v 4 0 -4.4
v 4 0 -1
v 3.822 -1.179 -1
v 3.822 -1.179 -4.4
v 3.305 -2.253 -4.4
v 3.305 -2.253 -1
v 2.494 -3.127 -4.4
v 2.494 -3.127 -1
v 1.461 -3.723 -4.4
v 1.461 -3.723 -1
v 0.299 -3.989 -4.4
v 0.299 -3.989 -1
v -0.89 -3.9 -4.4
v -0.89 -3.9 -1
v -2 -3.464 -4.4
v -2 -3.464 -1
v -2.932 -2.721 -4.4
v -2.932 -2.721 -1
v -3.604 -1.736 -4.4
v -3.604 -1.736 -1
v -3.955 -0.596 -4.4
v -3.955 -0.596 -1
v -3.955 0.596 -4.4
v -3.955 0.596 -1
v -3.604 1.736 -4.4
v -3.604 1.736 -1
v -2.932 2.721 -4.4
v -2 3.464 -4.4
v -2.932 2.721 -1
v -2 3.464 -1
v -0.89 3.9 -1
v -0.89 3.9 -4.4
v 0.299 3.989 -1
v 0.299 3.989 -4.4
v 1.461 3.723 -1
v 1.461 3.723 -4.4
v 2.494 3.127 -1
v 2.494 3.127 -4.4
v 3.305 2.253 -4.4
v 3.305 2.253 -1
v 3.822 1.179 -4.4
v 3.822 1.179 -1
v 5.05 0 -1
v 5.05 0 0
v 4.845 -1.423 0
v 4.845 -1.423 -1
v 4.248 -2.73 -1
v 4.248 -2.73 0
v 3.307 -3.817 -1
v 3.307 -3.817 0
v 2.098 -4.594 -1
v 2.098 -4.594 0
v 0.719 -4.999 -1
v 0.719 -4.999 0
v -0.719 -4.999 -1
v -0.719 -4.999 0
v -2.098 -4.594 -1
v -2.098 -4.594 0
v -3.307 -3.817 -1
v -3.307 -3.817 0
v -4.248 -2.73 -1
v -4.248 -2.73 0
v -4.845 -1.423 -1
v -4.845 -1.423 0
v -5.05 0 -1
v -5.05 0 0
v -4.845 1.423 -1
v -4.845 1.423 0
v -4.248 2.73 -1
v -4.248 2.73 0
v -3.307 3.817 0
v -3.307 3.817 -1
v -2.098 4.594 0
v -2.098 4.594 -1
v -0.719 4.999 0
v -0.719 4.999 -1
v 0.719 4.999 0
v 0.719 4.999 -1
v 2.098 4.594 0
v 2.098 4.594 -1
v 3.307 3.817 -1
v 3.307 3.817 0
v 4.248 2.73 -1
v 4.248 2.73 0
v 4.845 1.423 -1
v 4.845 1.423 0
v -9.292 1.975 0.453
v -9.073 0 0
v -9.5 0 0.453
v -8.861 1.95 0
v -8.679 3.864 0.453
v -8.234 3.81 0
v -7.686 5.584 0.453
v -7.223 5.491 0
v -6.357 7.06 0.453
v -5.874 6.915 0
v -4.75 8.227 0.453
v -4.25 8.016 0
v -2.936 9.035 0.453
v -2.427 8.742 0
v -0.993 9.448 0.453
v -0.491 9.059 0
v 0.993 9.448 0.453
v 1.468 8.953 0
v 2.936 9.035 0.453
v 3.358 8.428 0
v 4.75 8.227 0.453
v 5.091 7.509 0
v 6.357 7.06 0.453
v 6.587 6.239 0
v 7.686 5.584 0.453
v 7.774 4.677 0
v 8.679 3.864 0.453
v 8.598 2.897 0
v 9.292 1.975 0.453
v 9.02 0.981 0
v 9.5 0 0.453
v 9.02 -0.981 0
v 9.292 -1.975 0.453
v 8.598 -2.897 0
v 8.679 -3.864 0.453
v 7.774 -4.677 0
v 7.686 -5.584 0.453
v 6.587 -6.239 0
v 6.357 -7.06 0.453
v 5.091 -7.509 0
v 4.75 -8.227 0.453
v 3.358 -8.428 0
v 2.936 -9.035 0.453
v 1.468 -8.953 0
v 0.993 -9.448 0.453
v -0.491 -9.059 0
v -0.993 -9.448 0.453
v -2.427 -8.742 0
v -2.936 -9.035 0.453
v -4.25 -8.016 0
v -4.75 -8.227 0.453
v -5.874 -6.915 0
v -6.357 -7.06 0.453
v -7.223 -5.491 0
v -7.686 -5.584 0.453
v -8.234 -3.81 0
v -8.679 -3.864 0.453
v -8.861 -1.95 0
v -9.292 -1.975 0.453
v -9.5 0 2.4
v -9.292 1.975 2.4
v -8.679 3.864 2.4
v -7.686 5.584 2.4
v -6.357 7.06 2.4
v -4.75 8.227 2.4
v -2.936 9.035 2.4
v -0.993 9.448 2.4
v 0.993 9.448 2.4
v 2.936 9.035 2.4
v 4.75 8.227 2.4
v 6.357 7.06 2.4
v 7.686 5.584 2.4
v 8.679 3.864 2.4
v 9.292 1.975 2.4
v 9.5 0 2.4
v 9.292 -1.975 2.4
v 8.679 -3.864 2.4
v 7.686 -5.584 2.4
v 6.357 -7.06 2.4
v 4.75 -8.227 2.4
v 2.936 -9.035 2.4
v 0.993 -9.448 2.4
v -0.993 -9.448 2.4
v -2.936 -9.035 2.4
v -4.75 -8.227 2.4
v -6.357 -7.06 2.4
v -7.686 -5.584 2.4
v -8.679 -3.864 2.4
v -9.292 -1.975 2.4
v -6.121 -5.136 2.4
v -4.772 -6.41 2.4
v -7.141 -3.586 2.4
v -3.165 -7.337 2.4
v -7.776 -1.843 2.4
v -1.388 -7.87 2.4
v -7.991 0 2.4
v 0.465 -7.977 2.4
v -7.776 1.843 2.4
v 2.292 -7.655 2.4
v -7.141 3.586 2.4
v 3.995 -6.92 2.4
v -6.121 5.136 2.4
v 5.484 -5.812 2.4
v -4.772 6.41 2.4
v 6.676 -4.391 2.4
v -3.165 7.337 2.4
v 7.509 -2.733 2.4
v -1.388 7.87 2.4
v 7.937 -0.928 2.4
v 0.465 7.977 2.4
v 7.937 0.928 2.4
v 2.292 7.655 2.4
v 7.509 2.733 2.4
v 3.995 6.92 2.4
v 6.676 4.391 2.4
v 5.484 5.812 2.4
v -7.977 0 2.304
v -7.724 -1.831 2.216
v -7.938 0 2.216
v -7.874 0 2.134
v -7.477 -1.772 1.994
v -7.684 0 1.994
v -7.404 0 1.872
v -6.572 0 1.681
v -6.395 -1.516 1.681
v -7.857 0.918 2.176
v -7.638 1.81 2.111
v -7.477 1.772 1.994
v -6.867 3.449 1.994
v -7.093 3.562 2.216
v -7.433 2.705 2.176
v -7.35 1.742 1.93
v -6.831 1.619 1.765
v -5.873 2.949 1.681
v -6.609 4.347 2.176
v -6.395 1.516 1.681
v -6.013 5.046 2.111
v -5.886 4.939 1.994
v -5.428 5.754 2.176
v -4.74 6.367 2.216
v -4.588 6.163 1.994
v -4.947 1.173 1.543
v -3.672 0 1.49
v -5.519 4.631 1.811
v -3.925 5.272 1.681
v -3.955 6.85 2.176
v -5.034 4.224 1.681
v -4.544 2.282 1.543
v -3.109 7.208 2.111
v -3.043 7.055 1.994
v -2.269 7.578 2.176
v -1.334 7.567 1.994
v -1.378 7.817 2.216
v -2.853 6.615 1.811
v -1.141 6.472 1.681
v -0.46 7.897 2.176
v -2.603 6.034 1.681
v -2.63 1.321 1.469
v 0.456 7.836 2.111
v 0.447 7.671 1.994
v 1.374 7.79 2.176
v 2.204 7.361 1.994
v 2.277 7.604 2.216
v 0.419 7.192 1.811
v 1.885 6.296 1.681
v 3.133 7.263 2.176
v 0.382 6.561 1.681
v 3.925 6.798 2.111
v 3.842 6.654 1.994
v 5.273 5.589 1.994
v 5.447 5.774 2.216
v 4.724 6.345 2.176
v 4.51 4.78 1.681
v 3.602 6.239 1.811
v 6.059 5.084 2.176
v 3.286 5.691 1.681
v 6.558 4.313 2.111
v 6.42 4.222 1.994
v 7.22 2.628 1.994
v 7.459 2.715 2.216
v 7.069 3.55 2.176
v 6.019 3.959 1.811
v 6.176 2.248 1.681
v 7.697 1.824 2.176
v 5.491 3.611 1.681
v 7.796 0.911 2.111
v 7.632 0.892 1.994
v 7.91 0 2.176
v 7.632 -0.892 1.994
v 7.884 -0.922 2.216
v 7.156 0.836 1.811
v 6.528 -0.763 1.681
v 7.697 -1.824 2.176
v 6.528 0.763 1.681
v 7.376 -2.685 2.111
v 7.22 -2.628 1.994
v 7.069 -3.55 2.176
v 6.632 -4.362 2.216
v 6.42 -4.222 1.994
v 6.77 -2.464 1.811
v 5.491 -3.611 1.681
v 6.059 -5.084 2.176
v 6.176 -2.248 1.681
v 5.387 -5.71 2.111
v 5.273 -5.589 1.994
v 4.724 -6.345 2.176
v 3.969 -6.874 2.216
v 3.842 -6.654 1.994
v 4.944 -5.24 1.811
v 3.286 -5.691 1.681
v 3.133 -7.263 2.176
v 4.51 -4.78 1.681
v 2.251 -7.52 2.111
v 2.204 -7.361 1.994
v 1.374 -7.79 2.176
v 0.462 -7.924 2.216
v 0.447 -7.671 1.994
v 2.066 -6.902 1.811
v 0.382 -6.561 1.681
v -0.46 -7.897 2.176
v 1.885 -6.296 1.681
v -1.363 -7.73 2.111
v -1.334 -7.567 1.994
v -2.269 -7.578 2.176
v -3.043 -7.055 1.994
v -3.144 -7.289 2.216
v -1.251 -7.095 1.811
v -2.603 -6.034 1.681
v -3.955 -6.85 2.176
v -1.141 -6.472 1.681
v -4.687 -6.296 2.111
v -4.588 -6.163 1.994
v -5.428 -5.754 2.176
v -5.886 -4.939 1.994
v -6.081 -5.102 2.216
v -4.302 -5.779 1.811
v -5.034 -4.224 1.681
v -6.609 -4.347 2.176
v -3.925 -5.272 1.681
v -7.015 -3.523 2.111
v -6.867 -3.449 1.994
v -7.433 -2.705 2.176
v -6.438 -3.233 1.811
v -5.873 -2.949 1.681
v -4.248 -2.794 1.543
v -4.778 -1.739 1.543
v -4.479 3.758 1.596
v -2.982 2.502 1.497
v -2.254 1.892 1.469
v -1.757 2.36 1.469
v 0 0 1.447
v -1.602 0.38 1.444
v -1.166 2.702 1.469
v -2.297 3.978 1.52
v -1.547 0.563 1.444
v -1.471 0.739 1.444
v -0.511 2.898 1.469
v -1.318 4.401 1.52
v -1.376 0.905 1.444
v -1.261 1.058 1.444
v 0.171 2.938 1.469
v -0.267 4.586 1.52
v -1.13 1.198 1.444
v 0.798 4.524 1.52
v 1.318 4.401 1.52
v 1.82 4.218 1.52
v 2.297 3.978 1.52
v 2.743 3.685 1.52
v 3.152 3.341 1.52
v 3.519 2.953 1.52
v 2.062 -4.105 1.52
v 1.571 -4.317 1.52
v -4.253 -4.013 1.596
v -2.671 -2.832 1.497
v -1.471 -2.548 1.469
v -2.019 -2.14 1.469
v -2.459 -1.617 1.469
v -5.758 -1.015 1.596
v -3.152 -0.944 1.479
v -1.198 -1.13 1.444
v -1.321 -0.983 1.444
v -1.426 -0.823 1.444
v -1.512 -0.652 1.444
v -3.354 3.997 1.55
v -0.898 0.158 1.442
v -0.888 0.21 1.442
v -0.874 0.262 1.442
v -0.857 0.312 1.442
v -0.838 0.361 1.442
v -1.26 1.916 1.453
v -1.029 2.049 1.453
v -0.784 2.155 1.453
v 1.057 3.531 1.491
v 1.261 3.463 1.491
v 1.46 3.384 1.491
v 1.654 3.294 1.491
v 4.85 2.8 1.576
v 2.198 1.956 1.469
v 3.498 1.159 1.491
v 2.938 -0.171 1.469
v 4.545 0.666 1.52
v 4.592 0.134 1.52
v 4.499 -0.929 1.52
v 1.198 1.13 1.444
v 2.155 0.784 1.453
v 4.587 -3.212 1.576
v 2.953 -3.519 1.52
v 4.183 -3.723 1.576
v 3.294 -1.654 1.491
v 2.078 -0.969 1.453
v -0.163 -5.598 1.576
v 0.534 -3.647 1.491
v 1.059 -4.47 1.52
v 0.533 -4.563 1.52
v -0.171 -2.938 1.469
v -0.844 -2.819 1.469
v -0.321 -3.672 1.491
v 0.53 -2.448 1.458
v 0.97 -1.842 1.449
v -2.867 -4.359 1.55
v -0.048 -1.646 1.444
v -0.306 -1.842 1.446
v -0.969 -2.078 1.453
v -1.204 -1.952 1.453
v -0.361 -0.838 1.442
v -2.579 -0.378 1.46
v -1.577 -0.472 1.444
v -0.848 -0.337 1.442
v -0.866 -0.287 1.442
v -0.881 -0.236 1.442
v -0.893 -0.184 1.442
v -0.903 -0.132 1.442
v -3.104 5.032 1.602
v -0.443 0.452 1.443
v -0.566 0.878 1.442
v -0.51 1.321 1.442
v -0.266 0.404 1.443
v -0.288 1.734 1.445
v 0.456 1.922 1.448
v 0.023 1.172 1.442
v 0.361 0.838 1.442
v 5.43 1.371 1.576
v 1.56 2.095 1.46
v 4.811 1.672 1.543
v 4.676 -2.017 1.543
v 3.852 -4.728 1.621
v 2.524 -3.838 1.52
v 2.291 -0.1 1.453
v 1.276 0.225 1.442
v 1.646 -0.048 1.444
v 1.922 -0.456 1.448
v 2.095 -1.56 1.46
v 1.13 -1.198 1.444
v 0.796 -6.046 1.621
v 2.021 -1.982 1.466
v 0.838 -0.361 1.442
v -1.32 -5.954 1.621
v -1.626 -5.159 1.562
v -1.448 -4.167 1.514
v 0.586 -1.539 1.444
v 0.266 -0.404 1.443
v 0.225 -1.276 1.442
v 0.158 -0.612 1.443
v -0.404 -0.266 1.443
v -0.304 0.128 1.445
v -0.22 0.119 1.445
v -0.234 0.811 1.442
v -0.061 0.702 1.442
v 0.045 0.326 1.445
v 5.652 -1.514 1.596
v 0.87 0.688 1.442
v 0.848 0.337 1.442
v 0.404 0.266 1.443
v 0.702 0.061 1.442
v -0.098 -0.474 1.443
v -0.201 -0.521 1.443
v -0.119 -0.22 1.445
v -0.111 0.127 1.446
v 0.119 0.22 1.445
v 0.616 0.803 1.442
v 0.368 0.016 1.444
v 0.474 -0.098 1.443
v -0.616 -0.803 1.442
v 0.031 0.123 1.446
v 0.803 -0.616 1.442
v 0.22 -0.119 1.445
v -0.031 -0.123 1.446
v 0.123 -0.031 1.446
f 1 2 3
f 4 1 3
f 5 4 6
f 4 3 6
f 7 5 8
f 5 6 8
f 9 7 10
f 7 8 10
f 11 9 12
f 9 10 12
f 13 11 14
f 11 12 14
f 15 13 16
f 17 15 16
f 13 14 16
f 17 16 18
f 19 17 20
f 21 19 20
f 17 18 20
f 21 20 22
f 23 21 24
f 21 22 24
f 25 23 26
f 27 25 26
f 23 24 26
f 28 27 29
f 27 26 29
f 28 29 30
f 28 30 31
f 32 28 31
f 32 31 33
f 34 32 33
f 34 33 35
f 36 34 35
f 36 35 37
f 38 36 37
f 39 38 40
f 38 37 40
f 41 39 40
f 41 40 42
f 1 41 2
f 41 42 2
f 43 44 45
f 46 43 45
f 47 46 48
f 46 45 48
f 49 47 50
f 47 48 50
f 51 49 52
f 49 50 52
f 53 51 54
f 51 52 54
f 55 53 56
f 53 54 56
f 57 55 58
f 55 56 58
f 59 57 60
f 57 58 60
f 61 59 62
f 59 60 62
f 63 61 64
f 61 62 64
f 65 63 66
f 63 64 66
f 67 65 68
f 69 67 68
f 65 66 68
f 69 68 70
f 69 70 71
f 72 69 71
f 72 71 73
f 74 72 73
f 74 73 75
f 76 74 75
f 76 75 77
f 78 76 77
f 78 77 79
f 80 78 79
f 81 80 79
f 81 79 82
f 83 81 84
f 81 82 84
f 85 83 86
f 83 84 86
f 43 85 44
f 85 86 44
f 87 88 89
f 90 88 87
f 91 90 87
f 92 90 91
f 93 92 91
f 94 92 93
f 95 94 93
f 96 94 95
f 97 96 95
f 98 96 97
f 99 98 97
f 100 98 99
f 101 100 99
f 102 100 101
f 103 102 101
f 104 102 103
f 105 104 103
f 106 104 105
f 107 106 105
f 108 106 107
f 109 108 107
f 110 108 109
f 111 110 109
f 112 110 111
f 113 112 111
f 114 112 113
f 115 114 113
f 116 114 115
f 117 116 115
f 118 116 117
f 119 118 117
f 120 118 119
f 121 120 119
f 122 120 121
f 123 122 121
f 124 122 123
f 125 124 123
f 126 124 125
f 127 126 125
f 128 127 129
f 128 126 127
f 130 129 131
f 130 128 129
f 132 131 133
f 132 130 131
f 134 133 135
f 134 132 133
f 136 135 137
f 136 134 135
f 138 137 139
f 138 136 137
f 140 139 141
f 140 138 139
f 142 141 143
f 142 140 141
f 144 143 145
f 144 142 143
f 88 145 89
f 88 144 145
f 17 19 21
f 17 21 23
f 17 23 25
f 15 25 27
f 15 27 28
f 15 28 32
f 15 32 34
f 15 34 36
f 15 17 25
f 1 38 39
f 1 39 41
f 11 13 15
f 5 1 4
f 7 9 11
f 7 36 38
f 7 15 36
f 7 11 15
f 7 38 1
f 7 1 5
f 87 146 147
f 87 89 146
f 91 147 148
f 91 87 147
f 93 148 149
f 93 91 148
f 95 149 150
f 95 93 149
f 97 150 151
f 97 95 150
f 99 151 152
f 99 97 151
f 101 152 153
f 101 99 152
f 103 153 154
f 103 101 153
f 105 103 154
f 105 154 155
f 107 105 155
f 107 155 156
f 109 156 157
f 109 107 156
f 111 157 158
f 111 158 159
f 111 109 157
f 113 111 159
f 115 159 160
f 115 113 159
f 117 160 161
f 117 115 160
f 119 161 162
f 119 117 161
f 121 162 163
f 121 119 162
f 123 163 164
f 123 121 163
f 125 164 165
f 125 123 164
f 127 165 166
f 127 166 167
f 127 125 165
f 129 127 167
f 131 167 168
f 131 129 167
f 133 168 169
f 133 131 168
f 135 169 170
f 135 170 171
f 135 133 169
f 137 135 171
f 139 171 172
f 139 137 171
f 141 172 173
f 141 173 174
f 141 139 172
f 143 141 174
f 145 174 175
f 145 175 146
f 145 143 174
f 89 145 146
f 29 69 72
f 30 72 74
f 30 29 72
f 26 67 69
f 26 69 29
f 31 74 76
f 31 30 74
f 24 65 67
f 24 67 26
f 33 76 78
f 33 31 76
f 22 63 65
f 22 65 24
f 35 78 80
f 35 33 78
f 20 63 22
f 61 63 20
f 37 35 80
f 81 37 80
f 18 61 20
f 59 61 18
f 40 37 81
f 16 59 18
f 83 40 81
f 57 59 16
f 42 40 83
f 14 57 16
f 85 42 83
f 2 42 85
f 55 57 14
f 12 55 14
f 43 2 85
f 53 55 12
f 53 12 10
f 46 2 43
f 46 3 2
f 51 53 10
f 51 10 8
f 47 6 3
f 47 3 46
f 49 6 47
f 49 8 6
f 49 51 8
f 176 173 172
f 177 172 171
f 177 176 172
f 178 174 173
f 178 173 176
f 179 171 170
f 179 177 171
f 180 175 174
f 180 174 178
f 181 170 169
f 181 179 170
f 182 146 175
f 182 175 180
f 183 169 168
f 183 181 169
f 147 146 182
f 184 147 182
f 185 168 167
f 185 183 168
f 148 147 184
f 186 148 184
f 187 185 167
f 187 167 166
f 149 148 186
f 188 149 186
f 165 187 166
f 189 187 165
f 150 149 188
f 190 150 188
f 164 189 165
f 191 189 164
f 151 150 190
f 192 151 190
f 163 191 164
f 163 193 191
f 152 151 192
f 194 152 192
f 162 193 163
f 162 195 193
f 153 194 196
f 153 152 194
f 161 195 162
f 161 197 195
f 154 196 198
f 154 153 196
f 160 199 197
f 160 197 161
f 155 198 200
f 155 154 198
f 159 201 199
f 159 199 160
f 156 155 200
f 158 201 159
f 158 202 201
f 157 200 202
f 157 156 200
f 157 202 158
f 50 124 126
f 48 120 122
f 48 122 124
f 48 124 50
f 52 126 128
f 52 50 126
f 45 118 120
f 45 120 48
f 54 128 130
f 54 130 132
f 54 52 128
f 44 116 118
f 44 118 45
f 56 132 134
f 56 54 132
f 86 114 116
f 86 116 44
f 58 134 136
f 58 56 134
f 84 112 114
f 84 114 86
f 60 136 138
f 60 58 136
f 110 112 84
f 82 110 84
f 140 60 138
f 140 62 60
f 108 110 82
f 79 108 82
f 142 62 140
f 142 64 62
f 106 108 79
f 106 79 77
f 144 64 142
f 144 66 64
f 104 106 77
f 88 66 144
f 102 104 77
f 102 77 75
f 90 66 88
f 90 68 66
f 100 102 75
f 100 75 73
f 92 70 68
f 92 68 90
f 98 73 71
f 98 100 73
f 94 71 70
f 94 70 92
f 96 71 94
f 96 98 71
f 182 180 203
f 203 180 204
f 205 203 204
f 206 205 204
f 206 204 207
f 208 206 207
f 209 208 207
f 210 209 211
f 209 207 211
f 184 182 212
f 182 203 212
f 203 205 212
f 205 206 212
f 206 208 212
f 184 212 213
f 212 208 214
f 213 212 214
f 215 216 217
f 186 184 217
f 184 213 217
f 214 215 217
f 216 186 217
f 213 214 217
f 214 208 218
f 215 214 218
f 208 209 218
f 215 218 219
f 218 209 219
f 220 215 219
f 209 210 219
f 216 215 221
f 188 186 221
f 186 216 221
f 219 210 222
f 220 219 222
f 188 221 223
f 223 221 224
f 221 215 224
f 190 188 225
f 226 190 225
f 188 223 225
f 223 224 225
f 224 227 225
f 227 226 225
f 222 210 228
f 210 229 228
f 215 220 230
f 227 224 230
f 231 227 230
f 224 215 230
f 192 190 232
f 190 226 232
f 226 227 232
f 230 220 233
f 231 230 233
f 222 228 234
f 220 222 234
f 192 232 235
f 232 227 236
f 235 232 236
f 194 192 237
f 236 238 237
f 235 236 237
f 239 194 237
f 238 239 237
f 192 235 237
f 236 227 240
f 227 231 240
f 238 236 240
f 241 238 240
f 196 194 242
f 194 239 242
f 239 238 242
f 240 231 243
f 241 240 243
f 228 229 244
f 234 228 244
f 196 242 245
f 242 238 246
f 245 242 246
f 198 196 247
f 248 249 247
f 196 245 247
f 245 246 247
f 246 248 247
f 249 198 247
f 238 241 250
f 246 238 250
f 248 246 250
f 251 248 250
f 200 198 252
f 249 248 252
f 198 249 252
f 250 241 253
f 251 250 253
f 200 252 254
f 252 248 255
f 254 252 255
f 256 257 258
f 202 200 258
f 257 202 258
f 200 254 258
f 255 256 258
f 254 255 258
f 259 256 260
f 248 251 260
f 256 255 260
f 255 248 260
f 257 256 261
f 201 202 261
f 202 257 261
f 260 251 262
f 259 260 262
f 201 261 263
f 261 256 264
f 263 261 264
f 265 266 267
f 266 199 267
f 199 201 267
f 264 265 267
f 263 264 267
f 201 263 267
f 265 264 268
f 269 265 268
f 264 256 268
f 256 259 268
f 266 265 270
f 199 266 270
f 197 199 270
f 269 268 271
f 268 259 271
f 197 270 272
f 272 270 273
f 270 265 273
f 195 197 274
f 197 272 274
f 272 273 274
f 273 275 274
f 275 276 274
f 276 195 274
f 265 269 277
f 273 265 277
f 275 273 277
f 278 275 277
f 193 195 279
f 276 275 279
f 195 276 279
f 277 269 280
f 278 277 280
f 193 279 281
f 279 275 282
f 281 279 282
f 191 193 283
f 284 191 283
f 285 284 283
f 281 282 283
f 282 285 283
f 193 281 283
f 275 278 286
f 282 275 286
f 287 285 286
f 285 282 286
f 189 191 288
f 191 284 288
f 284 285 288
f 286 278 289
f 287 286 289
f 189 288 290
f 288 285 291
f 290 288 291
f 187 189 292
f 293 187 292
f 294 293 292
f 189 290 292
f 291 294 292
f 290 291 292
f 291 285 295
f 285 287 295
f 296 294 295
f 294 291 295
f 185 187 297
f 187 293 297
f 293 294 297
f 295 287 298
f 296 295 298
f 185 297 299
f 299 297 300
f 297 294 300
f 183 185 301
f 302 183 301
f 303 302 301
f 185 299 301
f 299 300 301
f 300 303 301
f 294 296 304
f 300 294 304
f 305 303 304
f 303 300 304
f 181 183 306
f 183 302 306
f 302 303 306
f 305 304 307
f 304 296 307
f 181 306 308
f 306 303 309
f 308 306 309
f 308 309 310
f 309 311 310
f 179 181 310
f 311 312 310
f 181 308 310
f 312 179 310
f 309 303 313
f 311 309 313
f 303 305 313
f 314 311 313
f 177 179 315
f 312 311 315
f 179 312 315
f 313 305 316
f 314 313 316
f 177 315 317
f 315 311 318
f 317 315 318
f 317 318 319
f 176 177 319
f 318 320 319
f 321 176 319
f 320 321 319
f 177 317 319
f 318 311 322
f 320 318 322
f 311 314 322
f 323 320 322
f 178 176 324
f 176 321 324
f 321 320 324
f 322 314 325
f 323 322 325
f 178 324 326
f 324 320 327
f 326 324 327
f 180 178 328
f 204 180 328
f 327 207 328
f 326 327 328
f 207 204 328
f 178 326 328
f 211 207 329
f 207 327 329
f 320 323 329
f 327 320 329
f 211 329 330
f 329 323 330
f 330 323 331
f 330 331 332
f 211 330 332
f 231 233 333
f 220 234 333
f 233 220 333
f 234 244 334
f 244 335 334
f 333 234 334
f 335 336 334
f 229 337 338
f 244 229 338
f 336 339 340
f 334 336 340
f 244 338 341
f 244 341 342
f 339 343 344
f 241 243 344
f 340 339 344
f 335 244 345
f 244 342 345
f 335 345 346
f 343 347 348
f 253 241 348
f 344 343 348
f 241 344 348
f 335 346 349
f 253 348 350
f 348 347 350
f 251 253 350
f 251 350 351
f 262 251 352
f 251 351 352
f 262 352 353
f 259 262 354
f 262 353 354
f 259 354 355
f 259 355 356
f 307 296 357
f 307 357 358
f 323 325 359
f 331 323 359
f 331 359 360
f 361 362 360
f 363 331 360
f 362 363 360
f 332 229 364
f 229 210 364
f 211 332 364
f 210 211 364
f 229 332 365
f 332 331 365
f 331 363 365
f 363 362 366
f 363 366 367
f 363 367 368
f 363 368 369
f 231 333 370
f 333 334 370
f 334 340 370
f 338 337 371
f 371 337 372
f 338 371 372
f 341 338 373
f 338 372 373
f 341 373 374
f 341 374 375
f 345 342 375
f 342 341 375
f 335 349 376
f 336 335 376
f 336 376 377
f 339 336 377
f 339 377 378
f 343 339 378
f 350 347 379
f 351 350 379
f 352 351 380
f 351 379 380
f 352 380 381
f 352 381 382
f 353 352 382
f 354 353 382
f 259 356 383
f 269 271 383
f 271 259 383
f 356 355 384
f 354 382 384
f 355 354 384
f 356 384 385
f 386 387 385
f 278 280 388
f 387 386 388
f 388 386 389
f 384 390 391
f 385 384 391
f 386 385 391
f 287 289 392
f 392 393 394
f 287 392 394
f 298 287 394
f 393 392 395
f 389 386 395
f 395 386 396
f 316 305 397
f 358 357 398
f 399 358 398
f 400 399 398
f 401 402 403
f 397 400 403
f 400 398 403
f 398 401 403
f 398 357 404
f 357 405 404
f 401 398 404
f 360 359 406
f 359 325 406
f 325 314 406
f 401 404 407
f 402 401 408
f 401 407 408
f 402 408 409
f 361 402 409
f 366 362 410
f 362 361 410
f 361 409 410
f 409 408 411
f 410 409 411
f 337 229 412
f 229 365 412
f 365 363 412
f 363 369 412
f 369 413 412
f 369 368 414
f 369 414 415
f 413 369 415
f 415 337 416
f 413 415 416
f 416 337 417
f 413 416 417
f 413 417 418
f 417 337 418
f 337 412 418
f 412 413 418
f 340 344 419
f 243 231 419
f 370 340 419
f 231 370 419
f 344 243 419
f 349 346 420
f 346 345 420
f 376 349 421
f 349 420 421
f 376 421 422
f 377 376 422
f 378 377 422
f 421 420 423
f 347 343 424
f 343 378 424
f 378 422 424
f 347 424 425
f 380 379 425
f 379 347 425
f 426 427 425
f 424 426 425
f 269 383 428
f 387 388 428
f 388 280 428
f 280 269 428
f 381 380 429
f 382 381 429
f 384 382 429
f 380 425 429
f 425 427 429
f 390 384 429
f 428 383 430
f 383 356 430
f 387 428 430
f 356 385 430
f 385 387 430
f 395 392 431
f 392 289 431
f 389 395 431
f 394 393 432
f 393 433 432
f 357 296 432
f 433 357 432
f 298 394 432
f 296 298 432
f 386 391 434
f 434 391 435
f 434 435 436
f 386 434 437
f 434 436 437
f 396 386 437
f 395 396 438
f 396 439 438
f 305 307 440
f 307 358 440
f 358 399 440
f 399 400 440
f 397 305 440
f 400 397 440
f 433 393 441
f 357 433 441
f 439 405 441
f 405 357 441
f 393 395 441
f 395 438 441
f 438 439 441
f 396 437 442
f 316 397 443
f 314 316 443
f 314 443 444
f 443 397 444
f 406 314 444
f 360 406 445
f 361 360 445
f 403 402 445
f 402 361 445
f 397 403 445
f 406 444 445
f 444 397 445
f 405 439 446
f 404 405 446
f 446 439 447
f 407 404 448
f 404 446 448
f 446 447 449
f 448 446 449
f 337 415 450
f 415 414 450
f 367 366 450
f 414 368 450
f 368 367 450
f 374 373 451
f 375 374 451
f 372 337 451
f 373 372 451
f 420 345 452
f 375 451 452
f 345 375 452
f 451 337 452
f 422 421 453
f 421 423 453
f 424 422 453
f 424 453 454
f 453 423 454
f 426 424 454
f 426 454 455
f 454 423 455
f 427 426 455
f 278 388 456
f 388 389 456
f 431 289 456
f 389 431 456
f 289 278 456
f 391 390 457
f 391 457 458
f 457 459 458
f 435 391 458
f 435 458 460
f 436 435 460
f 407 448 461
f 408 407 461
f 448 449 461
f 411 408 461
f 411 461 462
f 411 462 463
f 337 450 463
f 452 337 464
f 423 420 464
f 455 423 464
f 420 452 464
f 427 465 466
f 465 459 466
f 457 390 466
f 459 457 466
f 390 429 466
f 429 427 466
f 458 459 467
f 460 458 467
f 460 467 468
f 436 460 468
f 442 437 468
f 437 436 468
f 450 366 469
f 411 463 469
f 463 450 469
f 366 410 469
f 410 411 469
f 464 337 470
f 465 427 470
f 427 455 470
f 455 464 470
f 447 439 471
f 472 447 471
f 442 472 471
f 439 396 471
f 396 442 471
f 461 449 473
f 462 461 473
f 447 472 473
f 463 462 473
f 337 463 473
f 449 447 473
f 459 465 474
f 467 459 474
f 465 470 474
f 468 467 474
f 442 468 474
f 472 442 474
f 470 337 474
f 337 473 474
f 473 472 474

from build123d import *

# Parameters (mm, degrees)
F2_R     = 5.05
F3_DEPTH = 1
F4_R     = 4
F5_DEPTH = 3.4


with BuildPart() as f1:
    # F0 (on Front) → F1 (revolve)
    with BuildSketch(Plane.XZ):
        with BuildLine():
            Line((-7.9909514666, 2.4), (-9.5, 2.4))
            Line((-9.5, 2.4), (-9.5, 0.4530665231))
            Line((-9.5, 0.4530665231), (-9.0727129846, 0))
            Line((-9.0727129846, 0), (0, 0))
            Line((0, 0), (0, 1.4471871546))
            add(Edge.make_bspline(
                [(-7.9909514666, 2.4), (-7.9909515723, 1.617711094), (-2.9710125266, 1.4720783209), (-1.7912473995, 1.4308859827), (0, 1.4471871546)],
                knots=[0, 0, 0, 0, 0.5112998469, 1, 1, 1, 1], degree=3))
        make_face()
    revolve(axis=Axis((0, 0, 1.4471871546), (0, 0, -1)))

    # F2 (on face) → F3 (join)
    with BuildSketch(Plane(origin=(0, 0, 0), x_dir=(1, 0, 0), z_dir=(0, 0, -1))):
        Circle(F2_R)
    extrude(amount=F3_DEPTH)

    # F4 (on face) → F5 (join)
    with BuildSketch(Plane(origin=(0, 0, -1), x_dir=(1, 0, 0), z_dir=(0, 0, -1))):
        Circle(F4_R)
    extrude(amount=F5_DEPTH)


solid = f1.part
